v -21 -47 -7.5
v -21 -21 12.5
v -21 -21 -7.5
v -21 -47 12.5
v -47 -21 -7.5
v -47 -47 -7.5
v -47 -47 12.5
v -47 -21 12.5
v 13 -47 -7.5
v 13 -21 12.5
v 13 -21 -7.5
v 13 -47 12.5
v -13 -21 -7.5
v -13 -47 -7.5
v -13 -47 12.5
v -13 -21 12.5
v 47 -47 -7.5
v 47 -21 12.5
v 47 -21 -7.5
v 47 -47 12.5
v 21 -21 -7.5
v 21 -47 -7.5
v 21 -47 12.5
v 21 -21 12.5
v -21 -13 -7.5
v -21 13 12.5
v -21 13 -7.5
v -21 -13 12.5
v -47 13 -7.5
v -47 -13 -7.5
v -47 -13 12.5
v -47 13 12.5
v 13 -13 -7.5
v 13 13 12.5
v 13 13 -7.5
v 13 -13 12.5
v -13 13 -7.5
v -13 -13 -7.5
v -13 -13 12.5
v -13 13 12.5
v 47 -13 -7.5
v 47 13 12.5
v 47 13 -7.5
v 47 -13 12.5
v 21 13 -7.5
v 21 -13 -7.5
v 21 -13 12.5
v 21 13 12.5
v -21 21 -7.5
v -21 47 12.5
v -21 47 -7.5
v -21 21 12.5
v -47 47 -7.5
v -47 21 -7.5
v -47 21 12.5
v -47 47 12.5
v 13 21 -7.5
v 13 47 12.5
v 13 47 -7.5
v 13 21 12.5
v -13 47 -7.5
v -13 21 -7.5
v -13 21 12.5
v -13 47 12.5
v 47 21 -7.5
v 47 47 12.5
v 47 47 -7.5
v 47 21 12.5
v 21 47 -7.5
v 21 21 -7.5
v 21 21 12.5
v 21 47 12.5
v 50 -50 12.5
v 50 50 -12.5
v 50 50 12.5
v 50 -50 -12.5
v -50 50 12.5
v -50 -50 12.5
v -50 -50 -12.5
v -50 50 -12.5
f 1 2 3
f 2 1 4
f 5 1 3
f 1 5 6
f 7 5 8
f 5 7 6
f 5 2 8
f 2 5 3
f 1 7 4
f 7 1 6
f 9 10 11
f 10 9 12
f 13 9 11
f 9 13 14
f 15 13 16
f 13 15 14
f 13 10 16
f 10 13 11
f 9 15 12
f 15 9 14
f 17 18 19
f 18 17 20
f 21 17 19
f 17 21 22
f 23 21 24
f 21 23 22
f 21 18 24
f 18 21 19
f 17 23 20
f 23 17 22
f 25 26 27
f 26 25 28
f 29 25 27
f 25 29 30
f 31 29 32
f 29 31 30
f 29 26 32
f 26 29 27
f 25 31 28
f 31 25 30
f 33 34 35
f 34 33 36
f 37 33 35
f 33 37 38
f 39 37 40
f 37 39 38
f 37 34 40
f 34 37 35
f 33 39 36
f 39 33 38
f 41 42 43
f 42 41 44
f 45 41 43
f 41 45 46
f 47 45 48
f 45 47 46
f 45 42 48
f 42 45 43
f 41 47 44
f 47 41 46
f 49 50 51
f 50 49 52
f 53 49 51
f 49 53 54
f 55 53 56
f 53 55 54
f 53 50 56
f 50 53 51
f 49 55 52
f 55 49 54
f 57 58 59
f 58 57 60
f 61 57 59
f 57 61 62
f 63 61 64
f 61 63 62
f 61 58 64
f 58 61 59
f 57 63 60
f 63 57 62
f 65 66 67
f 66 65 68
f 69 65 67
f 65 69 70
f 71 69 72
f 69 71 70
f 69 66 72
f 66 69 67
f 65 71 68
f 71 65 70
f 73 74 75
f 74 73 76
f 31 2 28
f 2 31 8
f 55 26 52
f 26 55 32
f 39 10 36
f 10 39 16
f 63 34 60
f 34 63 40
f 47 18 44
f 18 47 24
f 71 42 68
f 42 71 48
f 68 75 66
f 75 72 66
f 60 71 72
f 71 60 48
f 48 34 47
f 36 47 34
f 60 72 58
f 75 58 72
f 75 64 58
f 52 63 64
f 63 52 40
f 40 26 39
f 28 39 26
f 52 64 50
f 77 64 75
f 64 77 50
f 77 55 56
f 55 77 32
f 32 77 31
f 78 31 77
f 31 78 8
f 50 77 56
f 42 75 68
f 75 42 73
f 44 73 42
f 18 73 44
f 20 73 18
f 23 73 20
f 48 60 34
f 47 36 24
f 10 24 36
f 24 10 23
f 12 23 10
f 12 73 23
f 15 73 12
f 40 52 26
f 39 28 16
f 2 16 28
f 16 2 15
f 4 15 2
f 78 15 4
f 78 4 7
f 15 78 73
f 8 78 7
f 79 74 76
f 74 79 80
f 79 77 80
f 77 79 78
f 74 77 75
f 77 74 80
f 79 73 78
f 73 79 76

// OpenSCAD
$fn = 32;

// ----------------------------------------------------------------------
// Pocket plate 100 x 100 x 25
// 3 x 3 pockets 26 mm square, 20 mm deep
// ----------------------------------------------------------------------

// --- parameters (mm) ---
thickness = 25;  // plate thickness
floor_t = 5;     // material left under each pocket
pocket = 26;     // pocket side length
pitch_x = 34;    // pocket pitch along X
pitch_y = 34;    // pocket pitch along Y
cols = 3;        // pockets per row
rows = 3;        // rows of pockets

// --- derived feature positions (mm) ---
depth = thickness - floor_t;        // = 20   pocket depth, down to the floor
span_x = (cols - 1) * pitch_x;      // = 68   distance between outer pockets
span_y = (rows - 1) * pitch_y;      // = 68   distance between outer pocket rows
origin_x = -span_x / 2;             // = -34   X of the first pocket
origin_y = -span_y / 2;             // = -34   Y of the first pocket
plate = [span_x + pocket + 6, span_y + pocket + 6, thickness];  // = [100, 100, 25]   overall size: pockets plus 3 mm of wall on each side
feature_centers = [
  [origin_x + 0 * pitch_x, origin_y + 0 * pitch_y],
  [origin_x + 1 * pitch_x, origin_y + 0 * pitch_y],
  [origin_x + 2 * pitch_x, origin_y + 0 * pitch_y],
  [origin_x + 0 * pitch_x, origin_y + 1 * pitch_y],
  [origin_x + 1 * pitch_x, origin_y + 1 * pitch_y],
  [origin_x + 2 * pitch_x, origin_y + 1 * pitch_y],
  [origin_x + 0 * pitch_x, origin_y + 2 * pitch_y],
  [origin_x + 1 * pitch_x, origin_y + 2 * pitch_y],
  [origin_x + 2 * pitch_x, origin_y + 2 * pitch_y]
];   // pocket centres, used verbatim by the cutter loop

// plate outline, then one pocket per centre in feature_centers
difference() {
  cube(plate, center = true);
  for (centre = feature_centers)
    translate([centre[0] - pocket / 2, centre[1] - pocket / 2, plate[2] / 2 - depth])
      cube([pocket, pocket, depth + 1]);  // centred on the declared pocket centre
}
